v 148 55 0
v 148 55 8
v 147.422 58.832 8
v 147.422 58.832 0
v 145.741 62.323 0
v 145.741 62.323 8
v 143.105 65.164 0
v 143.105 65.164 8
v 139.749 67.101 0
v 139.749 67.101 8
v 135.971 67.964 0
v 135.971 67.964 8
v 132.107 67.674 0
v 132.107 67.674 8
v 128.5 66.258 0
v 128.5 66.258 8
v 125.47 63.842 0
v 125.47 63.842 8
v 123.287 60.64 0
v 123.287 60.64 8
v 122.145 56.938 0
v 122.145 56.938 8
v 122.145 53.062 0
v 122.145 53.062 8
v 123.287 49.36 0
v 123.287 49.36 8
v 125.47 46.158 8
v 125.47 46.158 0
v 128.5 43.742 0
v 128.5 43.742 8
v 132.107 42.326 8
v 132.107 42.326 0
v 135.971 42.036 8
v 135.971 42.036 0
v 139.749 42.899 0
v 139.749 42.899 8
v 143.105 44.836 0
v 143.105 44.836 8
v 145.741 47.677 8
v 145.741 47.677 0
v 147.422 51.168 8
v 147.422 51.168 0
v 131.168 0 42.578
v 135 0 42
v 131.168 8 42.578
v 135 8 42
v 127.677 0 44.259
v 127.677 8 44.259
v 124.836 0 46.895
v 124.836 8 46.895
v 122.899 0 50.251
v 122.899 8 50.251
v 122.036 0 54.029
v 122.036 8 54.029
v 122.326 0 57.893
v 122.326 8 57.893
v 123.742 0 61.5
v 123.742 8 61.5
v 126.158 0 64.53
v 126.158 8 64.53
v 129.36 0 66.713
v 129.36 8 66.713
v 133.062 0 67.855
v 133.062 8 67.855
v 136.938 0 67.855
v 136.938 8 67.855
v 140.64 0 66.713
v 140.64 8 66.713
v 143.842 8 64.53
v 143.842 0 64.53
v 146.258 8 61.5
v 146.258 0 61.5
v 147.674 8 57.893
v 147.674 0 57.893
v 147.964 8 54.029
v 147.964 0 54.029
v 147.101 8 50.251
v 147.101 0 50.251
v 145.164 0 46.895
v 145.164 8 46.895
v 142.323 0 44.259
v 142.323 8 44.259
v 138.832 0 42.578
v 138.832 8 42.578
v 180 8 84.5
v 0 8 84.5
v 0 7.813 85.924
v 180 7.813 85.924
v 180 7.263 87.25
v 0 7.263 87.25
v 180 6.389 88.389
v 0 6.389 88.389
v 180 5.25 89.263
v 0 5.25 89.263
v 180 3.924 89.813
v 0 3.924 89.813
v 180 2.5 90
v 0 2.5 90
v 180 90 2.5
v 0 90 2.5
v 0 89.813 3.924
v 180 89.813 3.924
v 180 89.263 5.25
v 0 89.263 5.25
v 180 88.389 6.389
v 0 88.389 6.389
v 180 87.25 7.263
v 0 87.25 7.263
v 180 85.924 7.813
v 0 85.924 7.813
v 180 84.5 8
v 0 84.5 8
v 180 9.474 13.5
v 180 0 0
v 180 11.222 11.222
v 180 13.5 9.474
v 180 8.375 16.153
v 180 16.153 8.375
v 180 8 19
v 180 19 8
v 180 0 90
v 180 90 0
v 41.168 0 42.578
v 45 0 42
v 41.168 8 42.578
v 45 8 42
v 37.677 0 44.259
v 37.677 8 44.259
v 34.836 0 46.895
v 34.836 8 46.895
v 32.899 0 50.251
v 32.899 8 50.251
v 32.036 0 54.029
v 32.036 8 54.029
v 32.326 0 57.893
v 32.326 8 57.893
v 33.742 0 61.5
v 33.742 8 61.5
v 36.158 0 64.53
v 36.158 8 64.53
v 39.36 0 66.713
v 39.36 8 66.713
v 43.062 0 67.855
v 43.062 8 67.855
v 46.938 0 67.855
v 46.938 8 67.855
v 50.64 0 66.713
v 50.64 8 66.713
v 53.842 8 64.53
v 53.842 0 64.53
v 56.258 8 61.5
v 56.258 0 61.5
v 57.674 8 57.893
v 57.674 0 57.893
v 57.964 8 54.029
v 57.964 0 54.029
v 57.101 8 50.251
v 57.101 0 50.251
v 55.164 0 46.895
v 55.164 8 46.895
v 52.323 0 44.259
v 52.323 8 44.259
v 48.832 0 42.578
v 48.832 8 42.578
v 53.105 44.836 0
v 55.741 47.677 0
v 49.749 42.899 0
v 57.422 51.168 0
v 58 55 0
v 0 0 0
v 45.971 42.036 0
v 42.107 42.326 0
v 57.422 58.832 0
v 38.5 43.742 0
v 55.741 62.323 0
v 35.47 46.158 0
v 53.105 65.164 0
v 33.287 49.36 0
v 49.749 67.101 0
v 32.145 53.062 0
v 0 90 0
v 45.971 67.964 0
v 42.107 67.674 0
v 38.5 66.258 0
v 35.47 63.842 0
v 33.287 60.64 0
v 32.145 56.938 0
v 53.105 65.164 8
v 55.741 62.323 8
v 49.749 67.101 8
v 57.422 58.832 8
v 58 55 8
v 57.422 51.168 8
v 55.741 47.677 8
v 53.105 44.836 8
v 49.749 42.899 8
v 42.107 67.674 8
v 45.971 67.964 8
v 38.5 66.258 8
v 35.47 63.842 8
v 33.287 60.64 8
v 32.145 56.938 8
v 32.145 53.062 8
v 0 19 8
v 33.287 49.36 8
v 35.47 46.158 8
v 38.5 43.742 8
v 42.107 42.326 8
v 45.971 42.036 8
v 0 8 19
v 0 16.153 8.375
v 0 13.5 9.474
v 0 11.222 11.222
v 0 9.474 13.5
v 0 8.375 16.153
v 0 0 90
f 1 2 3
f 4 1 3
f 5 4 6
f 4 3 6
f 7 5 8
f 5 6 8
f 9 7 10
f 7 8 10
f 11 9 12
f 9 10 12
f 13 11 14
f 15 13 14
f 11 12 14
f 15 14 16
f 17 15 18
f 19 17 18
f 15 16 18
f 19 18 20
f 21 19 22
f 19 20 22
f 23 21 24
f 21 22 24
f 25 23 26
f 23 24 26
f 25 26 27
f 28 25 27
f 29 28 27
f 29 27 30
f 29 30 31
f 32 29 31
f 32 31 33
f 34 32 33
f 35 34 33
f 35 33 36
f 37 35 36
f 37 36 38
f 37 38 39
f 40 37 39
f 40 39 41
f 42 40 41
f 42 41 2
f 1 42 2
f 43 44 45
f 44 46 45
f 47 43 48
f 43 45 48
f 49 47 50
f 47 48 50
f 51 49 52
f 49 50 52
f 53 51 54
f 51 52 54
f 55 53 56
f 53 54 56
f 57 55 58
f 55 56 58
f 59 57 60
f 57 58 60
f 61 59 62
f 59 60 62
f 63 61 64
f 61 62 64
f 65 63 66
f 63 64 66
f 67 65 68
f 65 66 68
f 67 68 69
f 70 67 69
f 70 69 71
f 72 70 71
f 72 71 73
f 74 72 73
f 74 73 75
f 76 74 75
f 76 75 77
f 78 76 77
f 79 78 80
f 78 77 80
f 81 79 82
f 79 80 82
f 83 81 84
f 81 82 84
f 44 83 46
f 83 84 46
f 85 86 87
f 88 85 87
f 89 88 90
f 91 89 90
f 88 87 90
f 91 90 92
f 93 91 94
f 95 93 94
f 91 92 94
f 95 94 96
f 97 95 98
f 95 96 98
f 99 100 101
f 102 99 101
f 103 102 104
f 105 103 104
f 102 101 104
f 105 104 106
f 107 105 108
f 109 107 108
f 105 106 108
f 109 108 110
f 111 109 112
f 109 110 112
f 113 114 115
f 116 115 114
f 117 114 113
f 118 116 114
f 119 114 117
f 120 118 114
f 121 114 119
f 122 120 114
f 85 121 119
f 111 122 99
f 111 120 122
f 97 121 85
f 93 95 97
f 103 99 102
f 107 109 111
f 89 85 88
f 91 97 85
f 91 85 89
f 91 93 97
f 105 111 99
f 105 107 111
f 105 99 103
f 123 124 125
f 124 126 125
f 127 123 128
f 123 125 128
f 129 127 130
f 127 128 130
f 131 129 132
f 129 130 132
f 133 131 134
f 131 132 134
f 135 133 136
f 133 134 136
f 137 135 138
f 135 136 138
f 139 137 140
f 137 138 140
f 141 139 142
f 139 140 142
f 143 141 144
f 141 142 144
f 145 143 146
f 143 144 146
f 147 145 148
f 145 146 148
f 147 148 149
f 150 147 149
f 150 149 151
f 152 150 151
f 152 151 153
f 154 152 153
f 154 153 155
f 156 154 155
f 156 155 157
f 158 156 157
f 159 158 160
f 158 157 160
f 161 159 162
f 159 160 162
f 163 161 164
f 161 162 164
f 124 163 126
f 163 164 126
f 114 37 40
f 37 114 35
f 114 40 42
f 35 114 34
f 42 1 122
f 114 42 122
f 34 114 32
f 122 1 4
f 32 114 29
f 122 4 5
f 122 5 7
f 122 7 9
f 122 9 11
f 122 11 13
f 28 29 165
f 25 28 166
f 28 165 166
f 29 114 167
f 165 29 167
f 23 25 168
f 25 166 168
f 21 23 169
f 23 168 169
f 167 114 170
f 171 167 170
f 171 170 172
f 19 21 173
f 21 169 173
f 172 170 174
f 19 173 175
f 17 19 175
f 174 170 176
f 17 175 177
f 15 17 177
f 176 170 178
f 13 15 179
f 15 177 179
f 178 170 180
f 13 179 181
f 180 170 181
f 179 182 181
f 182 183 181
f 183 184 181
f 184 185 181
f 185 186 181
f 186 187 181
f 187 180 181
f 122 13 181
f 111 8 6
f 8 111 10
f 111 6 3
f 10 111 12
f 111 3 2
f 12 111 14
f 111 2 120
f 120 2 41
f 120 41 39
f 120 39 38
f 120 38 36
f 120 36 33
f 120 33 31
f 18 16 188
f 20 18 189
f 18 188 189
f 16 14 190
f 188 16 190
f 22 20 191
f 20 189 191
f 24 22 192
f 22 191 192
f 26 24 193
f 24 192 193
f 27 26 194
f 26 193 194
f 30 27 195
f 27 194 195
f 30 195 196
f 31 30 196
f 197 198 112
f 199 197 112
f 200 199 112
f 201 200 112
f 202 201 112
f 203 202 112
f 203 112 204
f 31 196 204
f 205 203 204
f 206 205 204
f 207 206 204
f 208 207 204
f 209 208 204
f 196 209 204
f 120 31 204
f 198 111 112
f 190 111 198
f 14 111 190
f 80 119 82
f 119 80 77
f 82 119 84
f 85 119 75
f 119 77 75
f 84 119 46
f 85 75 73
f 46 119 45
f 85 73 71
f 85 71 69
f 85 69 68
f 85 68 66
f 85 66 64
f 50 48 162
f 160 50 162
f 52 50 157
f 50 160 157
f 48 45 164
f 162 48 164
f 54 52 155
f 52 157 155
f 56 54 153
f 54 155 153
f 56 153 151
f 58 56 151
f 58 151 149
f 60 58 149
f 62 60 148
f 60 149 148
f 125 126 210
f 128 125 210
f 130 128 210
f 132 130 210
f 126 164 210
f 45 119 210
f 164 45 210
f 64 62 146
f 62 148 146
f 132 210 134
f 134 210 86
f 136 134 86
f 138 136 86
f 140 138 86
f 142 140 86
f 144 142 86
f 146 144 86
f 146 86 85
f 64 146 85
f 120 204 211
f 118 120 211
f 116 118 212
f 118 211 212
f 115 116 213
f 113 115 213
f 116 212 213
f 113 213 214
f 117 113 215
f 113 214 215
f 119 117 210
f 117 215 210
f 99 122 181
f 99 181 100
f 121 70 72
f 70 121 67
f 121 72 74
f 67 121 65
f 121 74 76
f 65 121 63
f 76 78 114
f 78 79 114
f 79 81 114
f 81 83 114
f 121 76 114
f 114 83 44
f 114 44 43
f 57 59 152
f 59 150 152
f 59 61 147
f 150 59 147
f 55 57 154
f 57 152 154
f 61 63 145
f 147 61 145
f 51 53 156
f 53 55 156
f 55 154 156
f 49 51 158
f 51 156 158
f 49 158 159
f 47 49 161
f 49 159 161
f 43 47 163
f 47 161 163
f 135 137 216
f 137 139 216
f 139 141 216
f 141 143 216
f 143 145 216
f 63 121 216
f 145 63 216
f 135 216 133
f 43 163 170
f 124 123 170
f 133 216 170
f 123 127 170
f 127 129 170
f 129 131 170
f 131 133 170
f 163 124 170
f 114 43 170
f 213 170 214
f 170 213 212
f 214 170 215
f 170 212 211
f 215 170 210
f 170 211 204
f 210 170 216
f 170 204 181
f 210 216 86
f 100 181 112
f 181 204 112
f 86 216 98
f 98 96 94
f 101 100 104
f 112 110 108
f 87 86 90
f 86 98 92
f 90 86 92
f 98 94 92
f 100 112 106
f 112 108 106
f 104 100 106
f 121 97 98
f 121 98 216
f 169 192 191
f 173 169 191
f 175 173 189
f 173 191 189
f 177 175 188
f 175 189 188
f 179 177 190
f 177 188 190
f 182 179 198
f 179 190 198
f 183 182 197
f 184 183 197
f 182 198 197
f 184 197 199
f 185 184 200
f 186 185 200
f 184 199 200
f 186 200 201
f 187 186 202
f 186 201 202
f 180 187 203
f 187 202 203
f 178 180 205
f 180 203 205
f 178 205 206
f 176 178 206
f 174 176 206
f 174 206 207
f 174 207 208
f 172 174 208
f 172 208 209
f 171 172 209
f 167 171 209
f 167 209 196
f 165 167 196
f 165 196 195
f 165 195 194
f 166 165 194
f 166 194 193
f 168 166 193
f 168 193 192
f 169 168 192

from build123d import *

# Parameters (mm, degrees)
ANGLES_EQUAL_90_X_90_X_8_1_DEPTH = 180
SKETCH12_R                       = 13
CUT_EXTRUDE1_DEPTH               = 221.45407685
LPATTERN1_COUNT                  = 2
LPATTERN1_PITCH                  = 90
CUT_EXTRUDE2_REACH               = 219.311
SKETCH13_R                       = 13
LPATTERN2_COUNT                  = 2
LPATTERN2_PITCH                  = 90


with BuildPart() as part:
    # Sketch11 → Angles equal 90 X 90 X 8(1) (new body)
    with BuildSketch(Plane(origin=(0, 45, 45), x_dir=(0, 1, 0), z_dir=(1, 0, 0))):
        with BuildLine():
            Line((-45, 45), (-45, -45))
            Line((-45, -45), (45, -45))
            Line((45, -45), (45, -42.5))
            ThreePointArc((45, -42.5), (43.389087297, -38.610912703), (39.5, -37))
            Line((39.5, -37), (-26, -37))
            ThreePointArc((-26, -37), (-33.778174593, -33.778174593), (-37, -26))
            Line((-37, -26), (-37, 39.5))
            ThreePointArc((-37, 39.5), (-38.610912703, 43.389087297), (-42.5, 45))
            Line((-42.5, 45), (-45, 45))
        make_face()
    extrude(amount=ANGLES_EQUAL_90_X_90_X_8_1_DEPTH)

    # Sketch12 → Cut-Extrude1 (cut, symmetric)
    with BuildSketch(Plane(origin=(0, 0, 0), x_dir=(1, 0, 0), z_dir=(0, 1, 0))):
        with Locations(Location((45, -55, 0), (0, 0, 90))):
            Circle(SKETCH12_R)
    cut_extrude1 = extrude(amount=CUT_EXTRUDE1_DEPTH, both=True, mode=Mode.SUBTRACT)

    # LPattern1: Cut-Extrude1 ×2
    with Locations(*[(i * LPATTERN1_PITCH, 0, 0) for i in range(1, LPATTERN1_COUNT)]):
        add(cut_extrude1, mode=Mode.SUBTRACT)

    # Sketch13 → Cut-Extrude2 (cut, up to next)
    with BuildSketch(Plane.XY.offset(8), mode=Mode.PRIVATE) as cut_extrude2_sk1:
        with Locations((45, 55)):
            Circle(SKETCH13_R)
    cut_extrude2_tool1 = extrude(cut_extrude2_sk1.sketch, amount=-CUT_EXTRUDE2_REACH, mode=Mode.PRIVATE) & part.part
    cut_extrude2 = cut_extrude2_tool1.solids().sort_by_distance((45, 55, 8))[0]
    add(cut_extrude2, mode=Mode.SUBTRACT)

    # LPattern2: Cut-Extrude2 ×2
    with Locations(*[(i * LPATTERN2_PITCH, 0, 0) for i in range(1, LPATTERN2_COUNT)]):
        add(cut_extrude2, mode=Mode.SUBTRACT)


solid = part.part
